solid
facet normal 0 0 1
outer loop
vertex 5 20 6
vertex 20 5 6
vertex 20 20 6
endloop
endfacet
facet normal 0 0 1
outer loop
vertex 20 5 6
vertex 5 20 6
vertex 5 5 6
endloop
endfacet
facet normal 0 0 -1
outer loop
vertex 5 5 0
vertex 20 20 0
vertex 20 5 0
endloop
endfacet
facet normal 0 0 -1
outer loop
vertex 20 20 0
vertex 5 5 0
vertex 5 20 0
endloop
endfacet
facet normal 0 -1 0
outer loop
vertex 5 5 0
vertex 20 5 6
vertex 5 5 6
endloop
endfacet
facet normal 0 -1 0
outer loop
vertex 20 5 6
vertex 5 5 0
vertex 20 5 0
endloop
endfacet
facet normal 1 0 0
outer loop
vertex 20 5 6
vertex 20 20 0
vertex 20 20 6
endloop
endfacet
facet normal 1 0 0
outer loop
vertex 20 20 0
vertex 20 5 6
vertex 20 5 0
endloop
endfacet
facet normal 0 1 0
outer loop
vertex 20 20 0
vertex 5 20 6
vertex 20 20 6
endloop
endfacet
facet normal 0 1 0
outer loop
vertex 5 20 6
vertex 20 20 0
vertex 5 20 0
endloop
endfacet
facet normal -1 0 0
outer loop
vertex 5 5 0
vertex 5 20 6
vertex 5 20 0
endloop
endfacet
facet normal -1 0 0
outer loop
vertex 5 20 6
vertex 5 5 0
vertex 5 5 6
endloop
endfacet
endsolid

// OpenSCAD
//e0();
e1();


module e1()
{
	translate([5,5,0])
		cube([15,15,6]);
}

module e0()
{
	difference()
	{
		cube([30,30,3]);
		translate([5,5,-1])
		cube([20,20,6]);
	}
}
